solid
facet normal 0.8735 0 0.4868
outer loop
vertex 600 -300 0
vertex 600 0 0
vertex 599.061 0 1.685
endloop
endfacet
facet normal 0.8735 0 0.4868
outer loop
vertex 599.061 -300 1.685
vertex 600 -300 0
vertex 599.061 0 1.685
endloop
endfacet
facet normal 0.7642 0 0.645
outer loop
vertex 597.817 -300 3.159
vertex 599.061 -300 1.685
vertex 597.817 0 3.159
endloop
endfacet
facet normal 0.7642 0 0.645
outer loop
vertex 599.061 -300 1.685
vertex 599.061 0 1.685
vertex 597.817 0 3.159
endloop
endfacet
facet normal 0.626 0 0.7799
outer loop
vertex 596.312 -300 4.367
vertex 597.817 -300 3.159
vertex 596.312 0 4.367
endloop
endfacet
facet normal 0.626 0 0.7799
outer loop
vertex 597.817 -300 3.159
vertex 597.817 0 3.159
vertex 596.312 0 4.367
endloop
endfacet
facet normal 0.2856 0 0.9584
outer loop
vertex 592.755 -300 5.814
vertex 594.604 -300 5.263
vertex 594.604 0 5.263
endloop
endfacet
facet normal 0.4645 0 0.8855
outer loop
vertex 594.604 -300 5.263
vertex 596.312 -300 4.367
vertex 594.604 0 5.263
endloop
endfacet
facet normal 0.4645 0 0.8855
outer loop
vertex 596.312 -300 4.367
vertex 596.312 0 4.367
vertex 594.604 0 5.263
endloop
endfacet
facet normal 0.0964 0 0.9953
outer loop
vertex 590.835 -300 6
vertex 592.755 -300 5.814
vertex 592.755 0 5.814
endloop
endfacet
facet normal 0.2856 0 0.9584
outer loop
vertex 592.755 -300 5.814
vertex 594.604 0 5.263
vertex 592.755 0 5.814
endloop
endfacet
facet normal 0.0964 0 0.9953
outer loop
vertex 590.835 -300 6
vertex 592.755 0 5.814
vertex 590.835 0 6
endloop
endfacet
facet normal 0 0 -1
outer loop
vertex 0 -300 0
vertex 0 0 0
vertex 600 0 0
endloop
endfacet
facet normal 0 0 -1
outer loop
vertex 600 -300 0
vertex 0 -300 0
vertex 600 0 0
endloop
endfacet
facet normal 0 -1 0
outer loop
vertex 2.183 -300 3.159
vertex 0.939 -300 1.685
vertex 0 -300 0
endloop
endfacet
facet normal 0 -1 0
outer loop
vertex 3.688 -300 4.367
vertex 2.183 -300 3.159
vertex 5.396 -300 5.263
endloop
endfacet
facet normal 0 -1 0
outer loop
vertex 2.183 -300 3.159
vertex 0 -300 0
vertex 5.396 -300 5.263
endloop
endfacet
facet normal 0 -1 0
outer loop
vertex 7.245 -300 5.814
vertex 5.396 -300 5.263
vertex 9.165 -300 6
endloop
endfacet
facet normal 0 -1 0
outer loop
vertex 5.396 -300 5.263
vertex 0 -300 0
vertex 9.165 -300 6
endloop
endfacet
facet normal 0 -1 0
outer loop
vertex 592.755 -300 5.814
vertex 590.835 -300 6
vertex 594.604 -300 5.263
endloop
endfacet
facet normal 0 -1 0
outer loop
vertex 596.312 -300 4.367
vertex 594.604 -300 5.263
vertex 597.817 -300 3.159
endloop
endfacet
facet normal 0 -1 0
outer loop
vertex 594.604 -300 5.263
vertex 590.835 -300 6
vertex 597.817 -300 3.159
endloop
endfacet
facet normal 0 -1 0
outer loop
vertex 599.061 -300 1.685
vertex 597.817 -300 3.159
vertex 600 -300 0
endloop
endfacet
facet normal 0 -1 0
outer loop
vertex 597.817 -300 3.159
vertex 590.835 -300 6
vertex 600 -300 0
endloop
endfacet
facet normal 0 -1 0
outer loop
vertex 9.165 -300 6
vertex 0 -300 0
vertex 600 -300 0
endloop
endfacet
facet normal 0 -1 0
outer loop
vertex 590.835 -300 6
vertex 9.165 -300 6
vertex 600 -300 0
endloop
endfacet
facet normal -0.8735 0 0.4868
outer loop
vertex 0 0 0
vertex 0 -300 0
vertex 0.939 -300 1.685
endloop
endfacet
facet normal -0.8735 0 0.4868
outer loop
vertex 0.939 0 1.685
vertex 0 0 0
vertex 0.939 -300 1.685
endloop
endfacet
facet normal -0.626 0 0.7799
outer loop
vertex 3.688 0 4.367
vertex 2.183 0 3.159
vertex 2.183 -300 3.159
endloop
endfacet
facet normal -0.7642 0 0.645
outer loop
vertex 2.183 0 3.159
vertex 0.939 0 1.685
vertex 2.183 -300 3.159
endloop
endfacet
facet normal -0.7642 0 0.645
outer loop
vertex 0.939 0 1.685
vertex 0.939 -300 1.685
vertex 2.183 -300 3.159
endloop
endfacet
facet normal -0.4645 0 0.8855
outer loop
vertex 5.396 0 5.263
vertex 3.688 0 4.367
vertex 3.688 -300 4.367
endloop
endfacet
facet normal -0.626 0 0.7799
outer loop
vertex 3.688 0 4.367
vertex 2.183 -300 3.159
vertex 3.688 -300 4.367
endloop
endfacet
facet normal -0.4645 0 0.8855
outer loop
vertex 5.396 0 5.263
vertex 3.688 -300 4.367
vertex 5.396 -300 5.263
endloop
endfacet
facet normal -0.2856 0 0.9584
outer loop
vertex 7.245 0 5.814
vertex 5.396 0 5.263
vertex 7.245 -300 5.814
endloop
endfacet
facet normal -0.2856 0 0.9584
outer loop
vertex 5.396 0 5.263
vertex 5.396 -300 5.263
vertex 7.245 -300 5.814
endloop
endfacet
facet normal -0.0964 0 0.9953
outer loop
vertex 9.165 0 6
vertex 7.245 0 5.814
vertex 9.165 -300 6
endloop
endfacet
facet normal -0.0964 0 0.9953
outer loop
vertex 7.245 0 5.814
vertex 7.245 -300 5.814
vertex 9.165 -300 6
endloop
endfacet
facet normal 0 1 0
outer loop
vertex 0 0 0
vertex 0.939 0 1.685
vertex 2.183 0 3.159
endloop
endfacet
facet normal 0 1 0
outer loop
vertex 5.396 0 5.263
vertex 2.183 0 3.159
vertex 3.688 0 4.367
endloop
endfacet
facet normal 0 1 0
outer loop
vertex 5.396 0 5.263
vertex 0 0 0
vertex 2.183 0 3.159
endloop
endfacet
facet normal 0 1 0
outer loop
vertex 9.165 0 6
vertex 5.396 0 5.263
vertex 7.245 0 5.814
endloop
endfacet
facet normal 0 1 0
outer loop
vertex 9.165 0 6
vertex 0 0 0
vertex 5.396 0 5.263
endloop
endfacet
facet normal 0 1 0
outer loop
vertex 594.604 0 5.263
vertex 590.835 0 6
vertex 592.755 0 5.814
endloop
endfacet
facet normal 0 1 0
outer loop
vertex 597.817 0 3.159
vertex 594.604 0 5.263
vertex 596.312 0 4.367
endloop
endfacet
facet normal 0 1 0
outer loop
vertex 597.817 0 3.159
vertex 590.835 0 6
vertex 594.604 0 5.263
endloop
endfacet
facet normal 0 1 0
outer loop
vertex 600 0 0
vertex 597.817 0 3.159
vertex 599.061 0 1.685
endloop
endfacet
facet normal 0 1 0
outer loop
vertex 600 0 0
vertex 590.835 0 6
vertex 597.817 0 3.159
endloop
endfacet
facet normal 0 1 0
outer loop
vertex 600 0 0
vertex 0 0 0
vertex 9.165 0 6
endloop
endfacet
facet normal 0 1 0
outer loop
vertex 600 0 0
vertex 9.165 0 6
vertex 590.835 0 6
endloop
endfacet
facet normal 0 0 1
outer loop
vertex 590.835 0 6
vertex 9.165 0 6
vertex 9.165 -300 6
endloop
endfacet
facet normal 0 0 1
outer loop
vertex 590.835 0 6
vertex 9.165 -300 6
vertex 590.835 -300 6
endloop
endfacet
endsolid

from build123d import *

# Parameters (mm, degrees)
ESBO_O1_W                = 600
ESBO_O1_H                = 300
RESSALTO_EXTRUS_O2_DEPTH = 6
FILETE1_R                = 10
FILETE2_R                = 10


with BuildPart() as part:
    # Esboço1 → Ressalto-extrusão2 (new body)
    with BuildSketch(Plane.XY):
        with Locations((300, -150)):
            Rectangle(ESBO_O1_W, ESBO_O1_H)
    extrude(amount=RESSALTO_EXTRUS_O2_DEPTH)

    # Filete1
    # the kernel refuses this fillet: 10 mm, written as the material it takes off along each edge
    with BuildSketch(Plane(origin=(600, 22.912878475, 6), x_dir=(0, 0, -1), z_dir=(0, -1, 0))) as filete1_piece_1:
        with BuildLine():
            CenterArc((10, -9.16515139), FILETE1_R, 113.578178478, 66.421821522)
            Line((0, -9.16515139), (-0.2, -9.16515139))
            Line((-0.2, -9.16515139), (-0.2, 0))
            Line((-0.2, 0), (0, 0.2))
            ThreePointArc((0, 0.2), (3, 0.2), (5.92, 0.183303028))
            Line((5.92, 0.183303028), (6, 0))
        make_face()
    extrude(amount=345.82575695, mode=Mode.SUBTRACT)

    # Filete2
    # the kernel refuses this fillet: 10 mm, written as the material it takes off along each edge
    with BuildSketch(Plane(origin=(0, -322.912878475, 6), x_dir=(1, 0, 0), z_dir=(0, 1, 0))) as filete2_piece_1:
        with BuildLine():
            CenterArc((9.16515139, 10), FILETE2_R, 203.578178478, 66.421821522)
            Line((0, 6), (-0.183303028, 5.92))
            ThreePointArc((-0.183303028, 5.92), (-0.2, 3), (-0.2, 0))
            Line((-0.2, 0), (0, -0.2))
            Line((0, -0.2), (9.16515139, -0.2))
            Line((9.16515139, -0.2), (9.16515139, 0))
        make_face()
    extrude(amount=345.82575695, mode=Mode.SUBTRACT)


solid = part.part
